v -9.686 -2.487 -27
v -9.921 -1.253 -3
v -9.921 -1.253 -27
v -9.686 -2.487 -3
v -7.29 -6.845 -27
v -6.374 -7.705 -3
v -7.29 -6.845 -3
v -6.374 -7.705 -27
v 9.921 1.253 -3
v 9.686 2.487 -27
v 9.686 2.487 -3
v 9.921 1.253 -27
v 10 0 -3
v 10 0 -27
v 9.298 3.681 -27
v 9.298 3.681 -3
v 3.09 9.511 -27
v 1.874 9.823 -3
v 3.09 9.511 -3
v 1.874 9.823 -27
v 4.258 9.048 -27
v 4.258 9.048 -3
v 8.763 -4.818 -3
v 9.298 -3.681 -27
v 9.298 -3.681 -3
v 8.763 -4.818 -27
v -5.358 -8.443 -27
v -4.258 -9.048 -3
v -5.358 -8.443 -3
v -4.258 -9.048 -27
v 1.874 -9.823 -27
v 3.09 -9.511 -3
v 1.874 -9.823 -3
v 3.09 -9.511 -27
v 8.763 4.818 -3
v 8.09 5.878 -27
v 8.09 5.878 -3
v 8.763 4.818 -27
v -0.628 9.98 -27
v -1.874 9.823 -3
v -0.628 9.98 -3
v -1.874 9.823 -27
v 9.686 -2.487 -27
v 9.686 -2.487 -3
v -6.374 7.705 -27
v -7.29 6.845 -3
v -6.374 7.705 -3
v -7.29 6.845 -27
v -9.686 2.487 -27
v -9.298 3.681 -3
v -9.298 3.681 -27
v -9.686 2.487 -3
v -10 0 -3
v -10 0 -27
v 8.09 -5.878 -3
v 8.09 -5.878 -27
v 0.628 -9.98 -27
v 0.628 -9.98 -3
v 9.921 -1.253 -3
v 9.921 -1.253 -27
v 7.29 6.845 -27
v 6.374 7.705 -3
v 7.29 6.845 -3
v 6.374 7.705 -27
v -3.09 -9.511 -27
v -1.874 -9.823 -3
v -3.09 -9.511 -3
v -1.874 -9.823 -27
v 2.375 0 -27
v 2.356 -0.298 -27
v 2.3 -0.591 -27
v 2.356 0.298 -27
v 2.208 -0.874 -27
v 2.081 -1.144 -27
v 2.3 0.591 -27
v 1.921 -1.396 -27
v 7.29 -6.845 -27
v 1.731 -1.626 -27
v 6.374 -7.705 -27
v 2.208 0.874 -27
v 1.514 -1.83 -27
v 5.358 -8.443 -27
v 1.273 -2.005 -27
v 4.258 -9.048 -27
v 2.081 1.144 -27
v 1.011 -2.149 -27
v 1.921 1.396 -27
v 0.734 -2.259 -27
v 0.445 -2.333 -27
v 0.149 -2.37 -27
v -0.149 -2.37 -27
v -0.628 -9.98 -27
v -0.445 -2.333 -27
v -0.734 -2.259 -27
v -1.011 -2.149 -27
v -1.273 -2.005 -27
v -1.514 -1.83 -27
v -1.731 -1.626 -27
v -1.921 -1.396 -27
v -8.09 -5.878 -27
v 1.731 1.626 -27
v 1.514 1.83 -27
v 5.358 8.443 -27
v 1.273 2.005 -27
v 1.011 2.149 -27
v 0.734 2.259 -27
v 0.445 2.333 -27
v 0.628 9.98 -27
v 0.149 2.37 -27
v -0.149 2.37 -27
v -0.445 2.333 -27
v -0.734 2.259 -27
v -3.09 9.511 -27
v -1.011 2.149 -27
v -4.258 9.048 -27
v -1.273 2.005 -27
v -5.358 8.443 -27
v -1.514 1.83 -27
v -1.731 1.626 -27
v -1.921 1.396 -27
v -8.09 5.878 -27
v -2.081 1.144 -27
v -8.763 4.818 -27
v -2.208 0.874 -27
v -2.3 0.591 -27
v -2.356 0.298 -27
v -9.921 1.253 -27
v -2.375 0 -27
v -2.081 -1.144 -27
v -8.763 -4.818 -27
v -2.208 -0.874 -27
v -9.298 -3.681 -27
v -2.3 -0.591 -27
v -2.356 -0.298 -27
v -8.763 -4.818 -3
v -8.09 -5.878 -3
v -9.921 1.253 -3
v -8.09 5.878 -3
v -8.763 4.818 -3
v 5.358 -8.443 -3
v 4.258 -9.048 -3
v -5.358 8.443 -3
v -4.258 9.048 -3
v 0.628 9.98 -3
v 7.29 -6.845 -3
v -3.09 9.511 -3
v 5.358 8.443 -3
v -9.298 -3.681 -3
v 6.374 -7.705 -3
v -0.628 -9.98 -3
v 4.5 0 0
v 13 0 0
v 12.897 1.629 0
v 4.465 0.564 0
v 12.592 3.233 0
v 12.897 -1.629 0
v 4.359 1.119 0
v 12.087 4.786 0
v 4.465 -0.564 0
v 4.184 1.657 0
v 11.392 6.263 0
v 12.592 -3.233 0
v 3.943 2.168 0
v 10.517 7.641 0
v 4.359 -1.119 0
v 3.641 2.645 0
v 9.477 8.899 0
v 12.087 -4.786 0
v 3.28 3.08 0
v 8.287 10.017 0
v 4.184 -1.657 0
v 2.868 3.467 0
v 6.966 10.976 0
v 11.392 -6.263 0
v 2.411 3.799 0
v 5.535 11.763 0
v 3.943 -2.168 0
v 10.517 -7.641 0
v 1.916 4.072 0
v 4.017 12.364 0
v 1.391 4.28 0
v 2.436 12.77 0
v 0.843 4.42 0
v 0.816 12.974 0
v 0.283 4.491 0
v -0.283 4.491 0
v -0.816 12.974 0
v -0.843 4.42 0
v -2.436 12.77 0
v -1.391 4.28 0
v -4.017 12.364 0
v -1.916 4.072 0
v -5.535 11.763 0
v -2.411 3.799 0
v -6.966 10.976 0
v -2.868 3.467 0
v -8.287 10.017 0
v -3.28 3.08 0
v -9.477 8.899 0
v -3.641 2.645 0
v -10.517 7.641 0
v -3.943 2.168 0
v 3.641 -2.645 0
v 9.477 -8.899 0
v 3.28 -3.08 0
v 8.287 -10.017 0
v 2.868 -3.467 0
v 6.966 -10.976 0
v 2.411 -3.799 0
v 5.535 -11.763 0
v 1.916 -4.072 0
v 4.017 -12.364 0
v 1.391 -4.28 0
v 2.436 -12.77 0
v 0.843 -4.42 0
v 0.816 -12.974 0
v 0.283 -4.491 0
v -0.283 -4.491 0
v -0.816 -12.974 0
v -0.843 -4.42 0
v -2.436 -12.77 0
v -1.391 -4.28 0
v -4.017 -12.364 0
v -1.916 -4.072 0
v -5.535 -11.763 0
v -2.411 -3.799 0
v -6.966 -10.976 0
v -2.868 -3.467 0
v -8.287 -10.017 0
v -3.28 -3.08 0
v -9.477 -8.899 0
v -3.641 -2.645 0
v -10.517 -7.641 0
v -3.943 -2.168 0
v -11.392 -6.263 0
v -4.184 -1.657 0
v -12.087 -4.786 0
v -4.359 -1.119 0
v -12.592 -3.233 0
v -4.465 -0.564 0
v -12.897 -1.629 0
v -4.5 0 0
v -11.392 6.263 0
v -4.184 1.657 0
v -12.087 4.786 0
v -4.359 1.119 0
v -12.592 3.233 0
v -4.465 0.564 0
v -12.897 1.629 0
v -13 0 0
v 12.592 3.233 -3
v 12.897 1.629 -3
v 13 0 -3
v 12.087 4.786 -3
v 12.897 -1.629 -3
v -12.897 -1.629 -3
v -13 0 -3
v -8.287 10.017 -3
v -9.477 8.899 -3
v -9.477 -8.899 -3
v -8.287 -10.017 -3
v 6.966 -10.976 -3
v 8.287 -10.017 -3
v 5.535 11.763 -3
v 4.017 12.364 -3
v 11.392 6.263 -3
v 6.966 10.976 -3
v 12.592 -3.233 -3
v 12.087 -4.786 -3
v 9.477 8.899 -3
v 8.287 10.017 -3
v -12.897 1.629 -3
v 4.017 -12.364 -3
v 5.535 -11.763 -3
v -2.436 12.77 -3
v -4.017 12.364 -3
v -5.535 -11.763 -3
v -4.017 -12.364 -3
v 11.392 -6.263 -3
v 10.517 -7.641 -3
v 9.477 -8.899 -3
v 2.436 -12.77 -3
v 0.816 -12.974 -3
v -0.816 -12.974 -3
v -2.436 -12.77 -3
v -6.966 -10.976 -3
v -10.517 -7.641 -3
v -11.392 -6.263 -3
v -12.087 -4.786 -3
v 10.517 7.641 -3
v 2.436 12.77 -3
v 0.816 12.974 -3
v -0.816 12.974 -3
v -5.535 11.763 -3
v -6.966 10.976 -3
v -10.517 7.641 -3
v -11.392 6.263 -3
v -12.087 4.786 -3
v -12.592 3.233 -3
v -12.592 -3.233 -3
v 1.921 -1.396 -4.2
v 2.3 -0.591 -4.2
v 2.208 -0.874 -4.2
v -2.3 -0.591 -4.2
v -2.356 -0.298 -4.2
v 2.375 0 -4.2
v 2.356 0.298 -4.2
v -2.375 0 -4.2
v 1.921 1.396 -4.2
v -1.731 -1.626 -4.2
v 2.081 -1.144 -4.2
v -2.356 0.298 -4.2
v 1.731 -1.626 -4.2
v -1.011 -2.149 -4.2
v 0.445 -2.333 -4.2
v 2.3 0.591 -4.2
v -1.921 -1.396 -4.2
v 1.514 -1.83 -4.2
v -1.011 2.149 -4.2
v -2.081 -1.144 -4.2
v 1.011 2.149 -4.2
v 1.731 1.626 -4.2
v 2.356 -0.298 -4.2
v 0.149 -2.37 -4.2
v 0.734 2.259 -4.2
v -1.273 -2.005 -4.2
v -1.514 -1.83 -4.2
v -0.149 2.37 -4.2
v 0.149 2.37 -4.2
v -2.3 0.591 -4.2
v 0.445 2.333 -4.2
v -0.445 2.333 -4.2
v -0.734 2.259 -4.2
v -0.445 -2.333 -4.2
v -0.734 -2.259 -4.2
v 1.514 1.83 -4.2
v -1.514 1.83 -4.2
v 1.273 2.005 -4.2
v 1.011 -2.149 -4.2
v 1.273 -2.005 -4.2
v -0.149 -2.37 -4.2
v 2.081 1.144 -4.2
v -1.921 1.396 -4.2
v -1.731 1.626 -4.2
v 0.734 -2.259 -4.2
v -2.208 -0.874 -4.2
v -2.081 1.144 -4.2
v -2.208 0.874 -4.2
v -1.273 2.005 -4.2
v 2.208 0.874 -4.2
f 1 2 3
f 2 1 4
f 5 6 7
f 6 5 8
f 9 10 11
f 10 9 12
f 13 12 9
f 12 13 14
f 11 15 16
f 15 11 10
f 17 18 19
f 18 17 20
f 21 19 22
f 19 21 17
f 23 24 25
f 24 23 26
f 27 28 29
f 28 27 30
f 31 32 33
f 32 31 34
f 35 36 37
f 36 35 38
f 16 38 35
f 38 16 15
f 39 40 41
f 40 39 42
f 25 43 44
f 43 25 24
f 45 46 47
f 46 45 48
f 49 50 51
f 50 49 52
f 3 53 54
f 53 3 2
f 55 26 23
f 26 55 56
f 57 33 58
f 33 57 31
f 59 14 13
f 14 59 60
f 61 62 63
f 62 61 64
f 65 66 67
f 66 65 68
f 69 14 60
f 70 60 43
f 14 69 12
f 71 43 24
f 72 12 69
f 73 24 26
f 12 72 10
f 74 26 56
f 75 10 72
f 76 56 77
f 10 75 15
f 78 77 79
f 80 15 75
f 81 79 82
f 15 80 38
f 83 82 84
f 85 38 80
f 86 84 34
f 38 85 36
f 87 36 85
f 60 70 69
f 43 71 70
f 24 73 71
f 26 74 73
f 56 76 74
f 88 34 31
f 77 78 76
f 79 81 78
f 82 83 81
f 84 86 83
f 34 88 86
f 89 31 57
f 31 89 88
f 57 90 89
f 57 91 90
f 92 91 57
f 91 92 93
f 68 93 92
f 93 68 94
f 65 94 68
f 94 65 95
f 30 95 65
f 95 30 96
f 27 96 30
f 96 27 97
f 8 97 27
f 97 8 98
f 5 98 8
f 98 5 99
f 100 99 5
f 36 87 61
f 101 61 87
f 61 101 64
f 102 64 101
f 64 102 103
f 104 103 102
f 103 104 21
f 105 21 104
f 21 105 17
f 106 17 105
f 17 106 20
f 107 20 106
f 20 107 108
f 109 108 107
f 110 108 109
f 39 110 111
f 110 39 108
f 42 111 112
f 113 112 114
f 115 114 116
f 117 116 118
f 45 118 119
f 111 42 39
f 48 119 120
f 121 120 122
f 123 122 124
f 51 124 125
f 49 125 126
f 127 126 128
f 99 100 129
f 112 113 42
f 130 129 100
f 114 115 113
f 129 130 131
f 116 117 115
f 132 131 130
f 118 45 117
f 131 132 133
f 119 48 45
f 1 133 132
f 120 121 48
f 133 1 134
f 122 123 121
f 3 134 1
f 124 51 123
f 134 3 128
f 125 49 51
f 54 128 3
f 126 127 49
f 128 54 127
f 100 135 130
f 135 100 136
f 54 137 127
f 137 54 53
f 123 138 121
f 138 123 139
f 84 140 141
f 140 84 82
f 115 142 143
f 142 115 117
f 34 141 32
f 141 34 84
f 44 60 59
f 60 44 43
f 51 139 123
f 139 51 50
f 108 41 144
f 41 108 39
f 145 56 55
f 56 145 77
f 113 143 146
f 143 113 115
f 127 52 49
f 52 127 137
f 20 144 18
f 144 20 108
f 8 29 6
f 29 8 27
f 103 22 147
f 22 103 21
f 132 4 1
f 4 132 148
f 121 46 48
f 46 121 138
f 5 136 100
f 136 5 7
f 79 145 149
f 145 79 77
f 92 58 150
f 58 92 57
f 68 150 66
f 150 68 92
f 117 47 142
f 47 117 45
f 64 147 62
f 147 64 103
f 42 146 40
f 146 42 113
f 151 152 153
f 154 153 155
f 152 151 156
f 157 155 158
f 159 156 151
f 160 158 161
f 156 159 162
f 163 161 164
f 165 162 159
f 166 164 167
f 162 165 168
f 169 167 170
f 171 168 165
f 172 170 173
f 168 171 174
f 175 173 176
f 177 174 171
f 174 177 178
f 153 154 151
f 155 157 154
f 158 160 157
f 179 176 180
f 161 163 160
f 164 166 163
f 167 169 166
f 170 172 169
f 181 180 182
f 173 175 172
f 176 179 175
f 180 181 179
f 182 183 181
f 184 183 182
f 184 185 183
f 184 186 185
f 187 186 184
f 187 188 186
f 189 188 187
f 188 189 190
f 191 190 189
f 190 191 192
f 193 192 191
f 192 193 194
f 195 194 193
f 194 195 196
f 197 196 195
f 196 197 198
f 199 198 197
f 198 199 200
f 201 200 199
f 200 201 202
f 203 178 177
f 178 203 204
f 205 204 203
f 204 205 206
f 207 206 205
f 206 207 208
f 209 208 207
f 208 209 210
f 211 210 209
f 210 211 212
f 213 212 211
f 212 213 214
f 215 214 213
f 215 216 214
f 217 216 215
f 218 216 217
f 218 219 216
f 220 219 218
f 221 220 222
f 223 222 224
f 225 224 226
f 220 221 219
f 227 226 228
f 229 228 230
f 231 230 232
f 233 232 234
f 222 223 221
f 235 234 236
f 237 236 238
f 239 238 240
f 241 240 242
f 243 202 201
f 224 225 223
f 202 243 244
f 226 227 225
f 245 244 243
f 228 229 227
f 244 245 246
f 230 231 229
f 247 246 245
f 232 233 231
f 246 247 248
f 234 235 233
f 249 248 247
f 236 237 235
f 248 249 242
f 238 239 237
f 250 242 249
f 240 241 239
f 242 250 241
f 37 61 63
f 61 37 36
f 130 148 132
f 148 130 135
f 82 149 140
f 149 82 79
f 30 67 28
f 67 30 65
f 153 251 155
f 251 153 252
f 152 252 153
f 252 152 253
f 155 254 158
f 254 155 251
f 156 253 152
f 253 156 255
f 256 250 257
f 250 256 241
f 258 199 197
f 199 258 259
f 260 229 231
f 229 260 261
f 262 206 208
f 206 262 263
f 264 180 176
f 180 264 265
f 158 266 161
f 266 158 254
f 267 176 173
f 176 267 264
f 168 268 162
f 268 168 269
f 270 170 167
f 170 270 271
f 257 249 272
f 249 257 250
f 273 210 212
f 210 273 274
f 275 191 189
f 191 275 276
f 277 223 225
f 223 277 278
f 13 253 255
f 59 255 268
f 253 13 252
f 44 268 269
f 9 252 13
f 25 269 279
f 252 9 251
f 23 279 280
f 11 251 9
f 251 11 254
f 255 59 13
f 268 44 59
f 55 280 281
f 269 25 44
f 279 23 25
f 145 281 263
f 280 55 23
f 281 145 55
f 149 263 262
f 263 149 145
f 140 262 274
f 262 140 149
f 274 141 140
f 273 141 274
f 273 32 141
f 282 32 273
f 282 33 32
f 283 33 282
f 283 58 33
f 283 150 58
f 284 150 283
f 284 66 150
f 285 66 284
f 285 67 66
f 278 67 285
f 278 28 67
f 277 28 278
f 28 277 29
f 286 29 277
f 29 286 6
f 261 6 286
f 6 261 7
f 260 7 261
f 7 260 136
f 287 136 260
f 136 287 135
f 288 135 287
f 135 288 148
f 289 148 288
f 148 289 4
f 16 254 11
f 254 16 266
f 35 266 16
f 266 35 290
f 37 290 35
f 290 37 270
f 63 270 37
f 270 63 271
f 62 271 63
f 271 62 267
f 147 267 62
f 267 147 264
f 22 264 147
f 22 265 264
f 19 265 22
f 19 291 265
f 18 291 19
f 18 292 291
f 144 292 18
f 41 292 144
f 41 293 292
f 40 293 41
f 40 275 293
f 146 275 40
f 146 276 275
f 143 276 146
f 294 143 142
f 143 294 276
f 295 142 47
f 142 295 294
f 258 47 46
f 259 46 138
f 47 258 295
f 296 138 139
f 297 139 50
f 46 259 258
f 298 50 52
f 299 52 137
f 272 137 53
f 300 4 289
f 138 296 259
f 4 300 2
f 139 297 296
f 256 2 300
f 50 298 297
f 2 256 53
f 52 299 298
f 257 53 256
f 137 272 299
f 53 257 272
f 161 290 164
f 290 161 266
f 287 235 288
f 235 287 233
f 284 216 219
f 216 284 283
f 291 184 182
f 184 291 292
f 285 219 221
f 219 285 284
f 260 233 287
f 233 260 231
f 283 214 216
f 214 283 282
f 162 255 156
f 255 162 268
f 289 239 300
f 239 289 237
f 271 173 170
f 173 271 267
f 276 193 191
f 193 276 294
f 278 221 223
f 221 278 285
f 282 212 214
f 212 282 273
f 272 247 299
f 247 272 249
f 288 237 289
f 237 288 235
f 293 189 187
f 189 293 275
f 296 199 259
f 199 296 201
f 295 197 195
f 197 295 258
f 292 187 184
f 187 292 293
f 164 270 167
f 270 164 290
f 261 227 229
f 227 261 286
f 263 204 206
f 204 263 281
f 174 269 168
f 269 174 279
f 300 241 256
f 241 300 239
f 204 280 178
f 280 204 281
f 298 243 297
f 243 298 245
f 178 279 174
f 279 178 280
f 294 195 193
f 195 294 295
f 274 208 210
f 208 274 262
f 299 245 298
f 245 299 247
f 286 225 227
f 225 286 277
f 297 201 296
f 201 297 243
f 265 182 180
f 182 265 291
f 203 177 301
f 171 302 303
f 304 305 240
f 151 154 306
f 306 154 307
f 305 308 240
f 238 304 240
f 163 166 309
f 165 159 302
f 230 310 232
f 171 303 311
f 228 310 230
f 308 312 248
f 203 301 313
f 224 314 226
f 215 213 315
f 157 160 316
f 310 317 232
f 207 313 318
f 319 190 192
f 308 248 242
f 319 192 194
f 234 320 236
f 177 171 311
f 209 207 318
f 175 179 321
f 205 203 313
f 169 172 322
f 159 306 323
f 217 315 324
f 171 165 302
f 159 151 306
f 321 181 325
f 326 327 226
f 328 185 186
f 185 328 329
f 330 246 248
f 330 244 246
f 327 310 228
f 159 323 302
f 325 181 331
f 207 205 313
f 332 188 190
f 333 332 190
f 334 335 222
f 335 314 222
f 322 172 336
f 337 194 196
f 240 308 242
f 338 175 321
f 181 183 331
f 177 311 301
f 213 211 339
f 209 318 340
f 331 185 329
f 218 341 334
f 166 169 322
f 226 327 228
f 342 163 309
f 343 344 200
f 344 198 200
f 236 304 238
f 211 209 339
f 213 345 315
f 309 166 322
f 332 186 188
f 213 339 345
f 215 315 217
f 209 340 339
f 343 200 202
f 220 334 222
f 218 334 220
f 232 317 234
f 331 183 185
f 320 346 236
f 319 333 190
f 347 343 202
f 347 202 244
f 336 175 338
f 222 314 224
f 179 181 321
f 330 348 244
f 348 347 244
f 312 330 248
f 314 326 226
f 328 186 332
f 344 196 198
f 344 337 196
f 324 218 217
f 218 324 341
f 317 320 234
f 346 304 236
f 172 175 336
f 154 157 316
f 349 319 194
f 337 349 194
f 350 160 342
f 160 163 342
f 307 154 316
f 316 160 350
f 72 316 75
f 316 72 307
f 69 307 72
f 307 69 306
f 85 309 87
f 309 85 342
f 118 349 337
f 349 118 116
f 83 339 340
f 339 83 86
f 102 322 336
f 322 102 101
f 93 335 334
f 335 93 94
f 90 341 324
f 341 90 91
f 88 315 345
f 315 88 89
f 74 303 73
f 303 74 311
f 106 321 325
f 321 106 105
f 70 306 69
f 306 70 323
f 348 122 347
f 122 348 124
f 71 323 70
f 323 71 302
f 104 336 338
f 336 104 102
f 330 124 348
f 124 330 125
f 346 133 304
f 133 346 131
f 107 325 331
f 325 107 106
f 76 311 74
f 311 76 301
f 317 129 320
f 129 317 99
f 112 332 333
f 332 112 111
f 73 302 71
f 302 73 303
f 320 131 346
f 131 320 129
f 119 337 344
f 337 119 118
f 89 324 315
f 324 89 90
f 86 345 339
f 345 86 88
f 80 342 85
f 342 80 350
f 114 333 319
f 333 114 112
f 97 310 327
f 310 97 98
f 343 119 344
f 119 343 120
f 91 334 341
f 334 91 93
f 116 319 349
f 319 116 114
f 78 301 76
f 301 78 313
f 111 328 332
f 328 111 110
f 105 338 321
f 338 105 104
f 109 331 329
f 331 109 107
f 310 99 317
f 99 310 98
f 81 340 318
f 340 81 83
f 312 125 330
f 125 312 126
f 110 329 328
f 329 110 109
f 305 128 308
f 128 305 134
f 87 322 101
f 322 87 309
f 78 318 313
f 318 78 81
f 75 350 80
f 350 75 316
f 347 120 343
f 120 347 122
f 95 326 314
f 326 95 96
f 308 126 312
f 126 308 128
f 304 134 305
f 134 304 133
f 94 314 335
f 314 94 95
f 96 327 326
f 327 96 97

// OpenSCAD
$fn = 50;


difference() {
	union() {
		translate(v = [0, 0, -27.0000000000]) {
			cylinder(h = 27, r = 10.0000000000);
		}
		translate(v = [0, 0, -3.0000000000]) {
			cylinder(h = 3, r = 13.0000000000);
		}
	}
	union() {
		translate(v = [0, 0, 0]) {
			rotate(a = [0, 0, 0]) {
				difference() {
					union() {
						#translate(v = [0, 0, -27.0000000000]) {
							cylinder(h = 27, r = 2.2500000000);
						}
						#translate(v = [0, 0, -4.2000000000]) {
							cylinder(h = 4.2000000000, r1 = 2.3750000000, r2 = 4.5000000000);
						}
						#translate(v = [0, 0, -27.0000000000]) {
							cylinder(h = 27, r = 2.3750000000);
						}
						#translate(v = [0, 0, -27.0000000000]) {
							cylinder(h = 27, r = 2.2500000000);
						}
					}
					union();
				}
			}
		}
	}
}
